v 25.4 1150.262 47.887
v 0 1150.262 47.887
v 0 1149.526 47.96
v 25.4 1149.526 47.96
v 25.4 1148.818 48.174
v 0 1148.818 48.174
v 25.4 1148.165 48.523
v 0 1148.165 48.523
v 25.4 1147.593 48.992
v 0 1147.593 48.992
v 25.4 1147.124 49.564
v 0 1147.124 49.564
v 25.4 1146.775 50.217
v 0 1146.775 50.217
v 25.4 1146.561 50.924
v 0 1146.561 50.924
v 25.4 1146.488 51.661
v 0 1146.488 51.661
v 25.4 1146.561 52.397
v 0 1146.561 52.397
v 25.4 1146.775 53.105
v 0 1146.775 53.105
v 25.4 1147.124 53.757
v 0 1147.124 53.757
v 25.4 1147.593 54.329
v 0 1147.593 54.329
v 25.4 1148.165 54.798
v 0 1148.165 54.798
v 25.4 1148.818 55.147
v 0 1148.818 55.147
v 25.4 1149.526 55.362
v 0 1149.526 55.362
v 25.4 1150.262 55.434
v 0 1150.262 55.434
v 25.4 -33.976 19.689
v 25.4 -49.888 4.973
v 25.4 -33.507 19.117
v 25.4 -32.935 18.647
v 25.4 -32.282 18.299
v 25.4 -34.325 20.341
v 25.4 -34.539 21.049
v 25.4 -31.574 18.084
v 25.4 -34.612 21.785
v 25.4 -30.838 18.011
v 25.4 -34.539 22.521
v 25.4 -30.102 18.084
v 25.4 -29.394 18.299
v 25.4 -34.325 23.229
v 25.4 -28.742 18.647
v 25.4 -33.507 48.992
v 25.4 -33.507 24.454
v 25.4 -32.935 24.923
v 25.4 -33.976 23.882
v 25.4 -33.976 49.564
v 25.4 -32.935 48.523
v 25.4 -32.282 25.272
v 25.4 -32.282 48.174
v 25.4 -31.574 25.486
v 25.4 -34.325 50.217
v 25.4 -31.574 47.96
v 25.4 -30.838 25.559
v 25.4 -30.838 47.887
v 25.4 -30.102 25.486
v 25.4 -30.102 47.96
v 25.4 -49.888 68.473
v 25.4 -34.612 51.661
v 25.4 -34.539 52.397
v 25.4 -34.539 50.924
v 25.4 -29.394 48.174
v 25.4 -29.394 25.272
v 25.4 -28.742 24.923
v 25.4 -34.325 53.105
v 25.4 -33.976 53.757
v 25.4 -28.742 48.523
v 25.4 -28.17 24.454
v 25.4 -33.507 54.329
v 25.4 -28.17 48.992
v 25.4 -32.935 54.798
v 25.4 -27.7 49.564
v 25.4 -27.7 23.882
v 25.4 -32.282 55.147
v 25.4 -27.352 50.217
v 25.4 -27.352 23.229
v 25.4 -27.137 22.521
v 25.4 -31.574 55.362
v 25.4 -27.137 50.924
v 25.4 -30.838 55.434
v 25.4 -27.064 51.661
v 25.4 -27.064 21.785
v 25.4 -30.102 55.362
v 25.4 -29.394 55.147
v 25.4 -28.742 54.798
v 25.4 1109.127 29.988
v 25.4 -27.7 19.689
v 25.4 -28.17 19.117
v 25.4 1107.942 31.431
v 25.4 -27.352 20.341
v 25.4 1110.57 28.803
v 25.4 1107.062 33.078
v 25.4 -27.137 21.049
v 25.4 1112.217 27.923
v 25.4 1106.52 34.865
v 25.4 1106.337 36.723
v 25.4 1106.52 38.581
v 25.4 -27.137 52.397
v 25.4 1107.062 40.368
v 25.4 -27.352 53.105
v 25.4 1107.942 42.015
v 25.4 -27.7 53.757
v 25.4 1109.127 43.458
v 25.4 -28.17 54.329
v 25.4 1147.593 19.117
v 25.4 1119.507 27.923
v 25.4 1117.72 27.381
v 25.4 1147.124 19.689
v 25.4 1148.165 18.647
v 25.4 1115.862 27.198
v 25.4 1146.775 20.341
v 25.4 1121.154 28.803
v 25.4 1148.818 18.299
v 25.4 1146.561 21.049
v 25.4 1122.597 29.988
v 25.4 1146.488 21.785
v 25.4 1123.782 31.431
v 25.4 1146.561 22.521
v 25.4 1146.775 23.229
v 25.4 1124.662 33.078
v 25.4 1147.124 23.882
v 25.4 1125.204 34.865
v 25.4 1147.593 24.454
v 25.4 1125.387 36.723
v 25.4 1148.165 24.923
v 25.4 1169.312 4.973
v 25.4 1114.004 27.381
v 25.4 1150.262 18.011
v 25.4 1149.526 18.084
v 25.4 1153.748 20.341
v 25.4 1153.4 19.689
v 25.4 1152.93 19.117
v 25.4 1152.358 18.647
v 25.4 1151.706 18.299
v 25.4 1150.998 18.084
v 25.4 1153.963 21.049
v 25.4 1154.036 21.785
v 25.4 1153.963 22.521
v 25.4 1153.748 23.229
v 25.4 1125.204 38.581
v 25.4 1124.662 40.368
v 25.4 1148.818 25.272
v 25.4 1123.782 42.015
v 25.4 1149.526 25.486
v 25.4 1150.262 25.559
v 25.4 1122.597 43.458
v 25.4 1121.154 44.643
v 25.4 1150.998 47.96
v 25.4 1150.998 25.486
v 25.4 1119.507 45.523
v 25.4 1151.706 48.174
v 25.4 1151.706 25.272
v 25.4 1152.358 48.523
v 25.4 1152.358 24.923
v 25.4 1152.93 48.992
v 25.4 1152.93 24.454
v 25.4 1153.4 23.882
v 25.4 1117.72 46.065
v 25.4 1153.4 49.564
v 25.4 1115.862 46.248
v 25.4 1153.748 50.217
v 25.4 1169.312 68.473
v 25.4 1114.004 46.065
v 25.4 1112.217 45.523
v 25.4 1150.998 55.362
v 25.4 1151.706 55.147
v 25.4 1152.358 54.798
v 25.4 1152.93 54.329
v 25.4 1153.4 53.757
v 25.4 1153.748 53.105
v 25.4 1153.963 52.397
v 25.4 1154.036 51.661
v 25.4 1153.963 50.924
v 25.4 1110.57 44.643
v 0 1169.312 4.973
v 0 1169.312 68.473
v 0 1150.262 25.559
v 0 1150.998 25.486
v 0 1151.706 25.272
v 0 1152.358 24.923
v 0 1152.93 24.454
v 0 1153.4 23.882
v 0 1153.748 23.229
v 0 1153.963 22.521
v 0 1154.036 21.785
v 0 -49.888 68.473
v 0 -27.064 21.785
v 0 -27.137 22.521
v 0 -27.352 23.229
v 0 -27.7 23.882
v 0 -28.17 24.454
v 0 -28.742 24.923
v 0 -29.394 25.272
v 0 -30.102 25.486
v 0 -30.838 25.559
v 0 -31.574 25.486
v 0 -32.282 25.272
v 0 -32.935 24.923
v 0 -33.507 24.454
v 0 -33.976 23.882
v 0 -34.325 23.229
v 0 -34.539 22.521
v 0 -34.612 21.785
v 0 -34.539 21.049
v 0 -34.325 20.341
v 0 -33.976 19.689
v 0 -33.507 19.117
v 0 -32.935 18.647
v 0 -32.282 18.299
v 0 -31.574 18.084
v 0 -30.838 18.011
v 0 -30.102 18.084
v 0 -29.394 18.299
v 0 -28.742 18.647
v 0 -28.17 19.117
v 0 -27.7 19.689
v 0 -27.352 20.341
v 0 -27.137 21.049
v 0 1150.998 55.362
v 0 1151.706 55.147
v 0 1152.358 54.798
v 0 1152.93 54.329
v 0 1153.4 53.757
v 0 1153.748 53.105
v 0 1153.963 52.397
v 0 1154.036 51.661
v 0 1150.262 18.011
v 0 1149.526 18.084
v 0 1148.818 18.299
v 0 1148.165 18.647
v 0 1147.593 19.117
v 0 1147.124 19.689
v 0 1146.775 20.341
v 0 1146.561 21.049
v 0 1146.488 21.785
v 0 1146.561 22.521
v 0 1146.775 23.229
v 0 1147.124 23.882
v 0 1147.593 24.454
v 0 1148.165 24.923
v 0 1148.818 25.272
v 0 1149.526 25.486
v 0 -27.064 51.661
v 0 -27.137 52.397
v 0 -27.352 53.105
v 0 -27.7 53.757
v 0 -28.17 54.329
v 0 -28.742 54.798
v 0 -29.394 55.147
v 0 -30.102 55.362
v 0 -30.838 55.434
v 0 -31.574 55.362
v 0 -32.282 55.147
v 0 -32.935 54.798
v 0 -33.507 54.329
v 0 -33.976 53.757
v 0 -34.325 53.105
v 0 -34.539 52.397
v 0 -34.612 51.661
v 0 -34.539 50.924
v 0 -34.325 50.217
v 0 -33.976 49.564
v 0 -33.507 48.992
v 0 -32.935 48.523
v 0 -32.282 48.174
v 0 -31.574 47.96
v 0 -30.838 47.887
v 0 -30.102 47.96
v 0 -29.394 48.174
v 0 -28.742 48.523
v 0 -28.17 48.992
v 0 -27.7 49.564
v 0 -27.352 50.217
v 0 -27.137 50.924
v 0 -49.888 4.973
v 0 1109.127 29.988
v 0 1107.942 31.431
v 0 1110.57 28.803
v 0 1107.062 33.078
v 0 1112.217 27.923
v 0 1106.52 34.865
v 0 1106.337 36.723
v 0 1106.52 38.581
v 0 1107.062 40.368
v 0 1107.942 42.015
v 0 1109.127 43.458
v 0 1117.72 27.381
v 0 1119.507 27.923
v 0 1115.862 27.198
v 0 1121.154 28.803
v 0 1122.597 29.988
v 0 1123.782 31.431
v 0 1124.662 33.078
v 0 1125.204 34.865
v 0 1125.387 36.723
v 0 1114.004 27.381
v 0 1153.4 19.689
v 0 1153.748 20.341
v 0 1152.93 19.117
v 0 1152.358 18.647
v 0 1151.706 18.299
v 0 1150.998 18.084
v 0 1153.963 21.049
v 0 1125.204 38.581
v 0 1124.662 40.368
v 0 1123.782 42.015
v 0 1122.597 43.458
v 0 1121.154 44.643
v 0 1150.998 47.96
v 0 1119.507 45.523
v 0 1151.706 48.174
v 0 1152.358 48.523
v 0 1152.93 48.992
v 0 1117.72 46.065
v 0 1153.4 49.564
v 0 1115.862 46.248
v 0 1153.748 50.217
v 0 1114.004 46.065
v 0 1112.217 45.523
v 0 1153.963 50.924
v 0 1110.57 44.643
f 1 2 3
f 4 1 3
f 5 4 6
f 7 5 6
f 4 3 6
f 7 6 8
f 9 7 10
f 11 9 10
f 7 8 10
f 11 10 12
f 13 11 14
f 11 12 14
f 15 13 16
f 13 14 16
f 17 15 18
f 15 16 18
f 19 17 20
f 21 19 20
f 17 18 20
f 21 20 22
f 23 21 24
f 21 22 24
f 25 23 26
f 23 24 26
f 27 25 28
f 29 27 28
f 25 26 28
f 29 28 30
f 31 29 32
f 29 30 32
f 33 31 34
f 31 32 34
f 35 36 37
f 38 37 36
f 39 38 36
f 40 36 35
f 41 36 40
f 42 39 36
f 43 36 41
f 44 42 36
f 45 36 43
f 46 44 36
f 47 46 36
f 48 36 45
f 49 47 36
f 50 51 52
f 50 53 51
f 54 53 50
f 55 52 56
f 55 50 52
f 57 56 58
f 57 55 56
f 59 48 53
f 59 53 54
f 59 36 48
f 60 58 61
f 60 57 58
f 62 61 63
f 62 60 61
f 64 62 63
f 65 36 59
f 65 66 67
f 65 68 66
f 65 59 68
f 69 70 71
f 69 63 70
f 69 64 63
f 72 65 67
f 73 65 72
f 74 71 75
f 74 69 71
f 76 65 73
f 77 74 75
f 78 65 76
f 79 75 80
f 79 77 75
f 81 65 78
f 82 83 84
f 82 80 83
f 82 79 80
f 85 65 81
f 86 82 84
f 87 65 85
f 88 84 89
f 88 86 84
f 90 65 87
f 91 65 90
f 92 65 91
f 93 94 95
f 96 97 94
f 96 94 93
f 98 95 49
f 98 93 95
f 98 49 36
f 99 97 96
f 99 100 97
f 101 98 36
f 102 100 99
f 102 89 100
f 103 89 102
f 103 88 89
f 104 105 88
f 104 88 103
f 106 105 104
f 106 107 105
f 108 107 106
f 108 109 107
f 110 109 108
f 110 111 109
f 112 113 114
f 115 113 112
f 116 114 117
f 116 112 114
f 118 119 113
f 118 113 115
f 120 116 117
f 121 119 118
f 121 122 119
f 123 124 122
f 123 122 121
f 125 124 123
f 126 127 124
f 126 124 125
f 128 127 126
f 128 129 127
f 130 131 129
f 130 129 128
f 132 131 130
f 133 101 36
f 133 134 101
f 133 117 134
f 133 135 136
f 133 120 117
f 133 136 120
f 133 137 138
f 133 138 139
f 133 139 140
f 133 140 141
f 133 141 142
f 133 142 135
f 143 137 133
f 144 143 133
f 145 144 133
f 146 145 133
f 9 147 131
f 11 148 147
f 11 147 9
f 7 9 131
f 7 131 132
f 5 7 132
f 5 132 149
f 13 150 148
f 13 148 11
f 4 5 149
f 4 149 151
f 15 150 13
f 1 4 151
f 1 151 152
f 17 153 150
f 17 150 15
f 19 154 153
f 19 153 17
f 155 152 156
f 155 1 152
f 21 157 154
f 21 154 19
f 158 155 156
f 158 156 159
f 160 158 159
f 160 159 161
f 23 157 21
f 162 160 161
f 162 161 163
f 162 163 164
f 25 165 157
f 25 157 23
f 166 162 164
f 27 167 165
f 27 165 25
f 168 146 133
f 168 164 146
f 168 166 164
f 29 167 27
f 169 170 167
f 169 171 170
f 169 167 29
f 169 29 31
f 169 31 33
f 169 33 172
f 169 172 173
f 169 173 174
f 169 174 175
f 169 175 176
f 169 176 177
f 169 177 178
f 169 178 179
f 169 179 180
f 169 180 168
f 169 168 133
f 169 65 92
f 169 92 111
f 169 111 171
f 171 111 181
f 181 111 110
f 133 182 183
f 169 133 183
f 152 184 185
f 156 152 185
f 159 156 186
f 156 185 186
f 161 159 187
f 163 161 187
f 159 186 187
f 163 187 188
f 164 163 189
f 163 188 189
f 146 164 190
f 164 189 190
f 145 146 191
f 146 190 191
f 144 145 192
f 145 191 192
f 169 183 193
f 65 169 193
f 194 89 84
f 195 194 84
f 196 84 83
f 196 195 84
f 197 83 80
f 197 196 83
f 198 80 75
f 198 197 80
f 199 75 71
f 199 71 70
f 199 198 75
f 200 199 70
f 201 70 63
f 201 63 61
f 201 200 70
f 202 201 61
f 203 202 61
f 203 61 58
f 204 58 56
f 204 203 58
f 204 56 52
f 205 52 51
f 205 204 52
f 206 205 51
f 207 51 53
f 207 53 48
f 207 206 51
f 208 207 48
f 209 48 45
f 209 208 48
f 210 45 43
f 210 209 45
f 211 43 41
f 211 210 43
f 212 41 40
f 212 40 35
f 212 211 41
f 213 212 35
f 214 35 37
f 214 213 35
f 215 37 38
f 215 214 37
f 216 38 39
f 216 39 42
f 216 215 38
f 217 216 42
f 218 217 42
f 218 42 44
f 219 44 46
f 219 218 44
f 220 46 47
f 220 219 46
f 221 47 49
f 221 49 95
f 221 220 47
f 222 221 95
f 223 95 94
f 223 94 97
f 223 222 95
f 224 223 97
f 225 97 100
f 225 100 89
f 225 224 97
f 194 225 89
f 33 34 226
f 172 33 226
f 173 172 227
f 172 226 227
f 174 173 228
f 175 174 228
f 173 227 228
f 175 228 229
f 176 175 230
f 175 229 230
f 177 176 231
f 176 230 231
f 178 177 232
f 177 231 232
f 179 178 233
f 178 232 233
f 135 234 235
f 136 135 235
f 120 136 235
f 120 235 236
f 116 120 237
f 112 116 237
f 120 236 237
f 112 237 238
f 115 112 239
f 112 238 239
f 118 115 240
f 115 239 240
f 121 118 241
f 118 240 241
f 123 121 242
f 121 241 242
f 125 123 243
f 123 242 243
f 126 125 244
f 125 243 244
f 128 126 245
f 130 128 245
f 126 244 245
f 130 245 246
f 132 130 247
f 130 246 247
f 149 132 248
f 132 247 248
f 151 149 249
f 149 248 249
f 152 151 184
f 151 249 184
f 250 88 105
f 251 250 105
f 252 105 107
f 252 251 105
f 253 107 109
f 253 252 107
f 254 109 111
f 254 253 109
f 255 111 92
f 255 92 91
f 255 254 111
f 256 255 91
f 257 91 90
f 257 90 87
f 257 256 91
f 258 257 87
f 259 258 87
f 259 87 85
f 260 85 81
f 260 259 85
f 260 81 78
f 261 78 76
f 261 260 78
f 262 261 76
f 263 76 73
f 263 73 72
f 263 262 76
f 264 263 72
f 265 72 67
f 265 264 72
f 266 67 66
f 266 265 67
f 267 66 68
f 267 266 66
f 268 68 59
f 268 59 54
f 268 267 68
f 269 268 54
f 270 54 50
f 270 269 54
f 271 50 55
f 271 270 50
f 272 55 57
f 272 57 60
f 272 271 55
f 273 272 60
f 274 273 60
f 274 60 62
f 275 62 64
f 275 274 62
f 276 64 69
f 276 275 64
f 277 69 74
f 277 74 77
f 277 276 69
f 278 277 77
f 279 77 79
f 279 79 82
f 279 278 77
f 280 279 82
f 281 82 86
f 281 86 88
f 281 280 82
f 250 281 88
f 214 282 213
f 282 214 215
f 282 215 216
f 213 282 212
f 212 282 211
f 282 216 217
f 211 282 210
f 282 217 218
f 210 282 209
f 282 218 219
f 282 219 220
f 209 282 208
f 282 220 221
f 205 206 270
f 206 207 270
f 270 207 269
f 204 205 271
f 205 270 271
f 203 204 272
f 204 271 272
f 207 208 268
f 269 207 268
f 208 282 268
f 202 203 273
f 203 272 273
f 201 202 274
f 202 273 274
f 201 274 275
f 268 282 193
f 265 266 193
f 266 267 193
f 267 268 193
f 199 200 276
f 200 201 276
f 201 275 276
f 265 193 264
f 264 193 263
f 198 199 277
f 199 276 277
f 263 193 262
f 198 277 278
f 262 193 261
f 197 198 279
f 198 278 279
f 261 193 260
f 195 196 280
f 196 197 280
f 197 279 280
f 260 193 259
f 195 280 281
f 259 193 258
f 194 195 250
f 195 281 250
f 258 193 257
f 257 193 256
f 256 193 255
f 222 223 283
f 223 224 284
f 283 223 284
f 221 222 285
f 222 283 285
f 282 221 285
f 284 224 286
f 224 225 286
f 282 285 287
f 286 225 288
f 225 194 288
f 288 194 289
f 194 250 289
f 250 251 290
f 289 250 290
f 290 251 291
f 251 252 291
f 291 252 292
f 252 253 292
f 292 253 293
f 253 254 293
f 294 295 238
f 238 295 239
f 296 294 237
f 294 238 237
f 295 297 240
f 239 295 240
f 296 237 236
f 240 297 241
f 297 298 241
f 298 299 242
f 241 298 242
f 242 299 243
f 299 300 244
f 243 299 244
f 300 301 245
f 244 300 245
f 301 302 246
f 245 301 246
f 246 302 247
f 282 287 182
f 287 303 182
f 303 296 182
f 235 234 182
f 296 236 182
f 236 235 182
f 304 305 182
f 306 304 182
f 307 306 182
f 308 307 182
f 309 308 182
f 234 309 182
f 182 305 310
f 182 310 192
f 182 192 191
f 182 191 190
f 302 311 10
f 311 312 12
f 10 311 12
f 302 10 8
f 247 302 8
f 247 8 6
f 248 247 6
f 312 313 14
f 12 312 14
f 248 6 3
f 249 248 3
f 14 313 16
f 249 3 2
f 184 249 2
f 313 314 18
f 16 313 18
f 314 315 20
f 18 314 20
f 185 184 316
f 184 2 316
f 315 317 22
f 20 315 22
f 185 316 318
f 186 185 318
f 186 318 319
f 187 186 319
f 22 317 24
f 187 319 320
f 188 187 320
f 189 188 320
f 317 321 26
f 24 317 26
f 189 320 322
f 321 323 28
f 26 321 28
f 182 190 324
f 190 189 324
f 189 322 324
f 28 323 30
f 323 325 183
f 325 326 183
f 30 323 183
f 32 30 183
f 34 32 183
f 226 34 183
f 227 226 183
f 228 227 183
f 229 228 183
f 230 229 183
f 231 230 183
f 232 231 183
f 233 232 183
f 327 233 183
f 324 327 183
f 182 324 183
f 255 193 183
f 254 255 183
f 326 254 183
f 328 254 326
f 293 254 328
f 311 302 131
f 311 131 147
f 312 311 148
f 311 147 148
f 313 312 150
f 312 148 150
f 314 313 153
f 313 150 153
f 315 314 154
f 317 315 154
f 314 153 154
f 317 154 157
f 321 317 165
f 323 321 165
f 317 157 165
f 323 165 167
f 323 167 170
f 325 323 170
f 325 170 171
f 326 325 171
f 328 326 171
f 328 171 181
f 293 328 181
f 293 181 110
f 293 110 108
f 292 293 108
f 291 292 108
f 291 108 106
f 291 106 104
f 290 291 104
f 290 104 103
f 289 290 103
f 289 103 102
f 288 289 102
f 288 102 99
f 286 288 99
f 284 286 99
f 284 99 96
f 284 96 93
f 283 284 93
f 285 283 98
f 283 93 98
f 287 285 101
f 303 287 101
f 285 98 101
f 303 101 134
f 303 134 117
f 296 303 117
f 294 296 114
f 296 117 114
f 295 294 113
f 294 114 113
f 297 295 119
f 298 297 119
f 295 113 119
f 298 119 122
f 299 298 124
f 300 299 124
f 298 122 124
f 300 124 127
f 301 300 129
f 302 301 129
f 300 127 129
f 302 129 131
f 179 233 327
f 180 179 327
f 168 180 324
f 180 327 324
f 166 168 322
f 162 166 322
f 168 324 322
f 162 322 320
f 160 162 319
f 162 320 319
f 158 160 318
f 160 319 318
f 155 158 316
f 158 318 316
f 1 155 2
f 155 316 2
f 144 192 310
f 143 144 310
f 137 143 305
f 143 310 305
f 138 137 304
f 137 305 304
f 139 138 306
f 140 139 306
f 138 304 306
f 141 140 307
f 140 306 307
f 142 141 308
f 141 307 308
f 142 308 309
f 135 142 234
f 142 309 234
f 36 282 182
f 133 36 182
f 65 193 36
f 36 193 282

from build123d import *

# Parameters (mm, degrees)
F0_R     = 3.773713
F1_DEPTH = 25.4
F2_R     = 9.525
F3_DEPTH = 25.401


with BuildPart() as f1:
    # F0 (on Right) → F1 (new body)
    with BuildSketch(Plane.YZ):
        with BuildLine():
            Line((1150.261795, 68.472956), (-49.888205, 68.472956))
            Line((-49.888205, 68.472956), (-49.888205, 4.972956))
            Line((-49.888205, 4.972956), (1150.261795, 4.972956))
            Line((1150.261795, 4.972956), (1150.261795, 18.01149))
            ThreePointArc((1150.261795, 18.01149), (1146.488082, 21.785202), (1150.261795, 25.558915))
            Line((1150.261795, 25.558915), (1150.261795, 47.886996))
            ThreePointArc((1150.261795, 47.886996), (1146.488082, 51.660709), (1150.261795, 55.434422))
            Line((1150.261795, 55.434422), (1150.261795, 68.472956))
        make_face()
        with Locations((-30.838205, 21.785202)):
            Circle(F0_R, mode=Mode.SUBTRACT)
        with Locations((-30.838205, 51.660709)):
            Circle(F0_R, mode=Mode.SUBTRACT)
        with BuildLine():
            Line((1169.311795, 68.472956), (1150.261795, 68.472956))
            Line((1150.261795, 68.472956), (1150.261795, 55.434422))
            ThreePointArc((1150.261795, 55.434422), (1152.930212, 54.329127), (1154.035507, 51.660709))
            ThreePointArc((1154.035507, 51.660709), (1152.930212, 48.992291), (1150.261795, 47.886996))
            Line((1150.261795, 47.886996), (1150.261795, 25.558915))
            ThreePointArc((1150.261795, 25.558915), (1152.930212, 24.45362), (1154.035507, 21.785202))
            ThreePointArc((1154.035507, 21.785202), (1152.930212, 19.116784), (1150.261795, 18.01149))
            Line((1150.261795, 18.01149), (1150.261795, 4.972956))
            Line((1150.261795, 4.972956), (1169.311795, 4.972956))
            Line((1169.311795, 4.972956), (1169.311795, 68.472956))
        make_face()
    extrude(amount=F1_DEPTH)

    # F2 (on face) → F3 (cut, through all)
    with BuildSketch(Plane.YZ.offset(25.4)):
        with Locations((1115.862012, 36.722956)):
            Circle(F2_R)
    extrude(amount=-F3_DEPTH, mode=Mode.SUBTRACT)


solid = f1.part
